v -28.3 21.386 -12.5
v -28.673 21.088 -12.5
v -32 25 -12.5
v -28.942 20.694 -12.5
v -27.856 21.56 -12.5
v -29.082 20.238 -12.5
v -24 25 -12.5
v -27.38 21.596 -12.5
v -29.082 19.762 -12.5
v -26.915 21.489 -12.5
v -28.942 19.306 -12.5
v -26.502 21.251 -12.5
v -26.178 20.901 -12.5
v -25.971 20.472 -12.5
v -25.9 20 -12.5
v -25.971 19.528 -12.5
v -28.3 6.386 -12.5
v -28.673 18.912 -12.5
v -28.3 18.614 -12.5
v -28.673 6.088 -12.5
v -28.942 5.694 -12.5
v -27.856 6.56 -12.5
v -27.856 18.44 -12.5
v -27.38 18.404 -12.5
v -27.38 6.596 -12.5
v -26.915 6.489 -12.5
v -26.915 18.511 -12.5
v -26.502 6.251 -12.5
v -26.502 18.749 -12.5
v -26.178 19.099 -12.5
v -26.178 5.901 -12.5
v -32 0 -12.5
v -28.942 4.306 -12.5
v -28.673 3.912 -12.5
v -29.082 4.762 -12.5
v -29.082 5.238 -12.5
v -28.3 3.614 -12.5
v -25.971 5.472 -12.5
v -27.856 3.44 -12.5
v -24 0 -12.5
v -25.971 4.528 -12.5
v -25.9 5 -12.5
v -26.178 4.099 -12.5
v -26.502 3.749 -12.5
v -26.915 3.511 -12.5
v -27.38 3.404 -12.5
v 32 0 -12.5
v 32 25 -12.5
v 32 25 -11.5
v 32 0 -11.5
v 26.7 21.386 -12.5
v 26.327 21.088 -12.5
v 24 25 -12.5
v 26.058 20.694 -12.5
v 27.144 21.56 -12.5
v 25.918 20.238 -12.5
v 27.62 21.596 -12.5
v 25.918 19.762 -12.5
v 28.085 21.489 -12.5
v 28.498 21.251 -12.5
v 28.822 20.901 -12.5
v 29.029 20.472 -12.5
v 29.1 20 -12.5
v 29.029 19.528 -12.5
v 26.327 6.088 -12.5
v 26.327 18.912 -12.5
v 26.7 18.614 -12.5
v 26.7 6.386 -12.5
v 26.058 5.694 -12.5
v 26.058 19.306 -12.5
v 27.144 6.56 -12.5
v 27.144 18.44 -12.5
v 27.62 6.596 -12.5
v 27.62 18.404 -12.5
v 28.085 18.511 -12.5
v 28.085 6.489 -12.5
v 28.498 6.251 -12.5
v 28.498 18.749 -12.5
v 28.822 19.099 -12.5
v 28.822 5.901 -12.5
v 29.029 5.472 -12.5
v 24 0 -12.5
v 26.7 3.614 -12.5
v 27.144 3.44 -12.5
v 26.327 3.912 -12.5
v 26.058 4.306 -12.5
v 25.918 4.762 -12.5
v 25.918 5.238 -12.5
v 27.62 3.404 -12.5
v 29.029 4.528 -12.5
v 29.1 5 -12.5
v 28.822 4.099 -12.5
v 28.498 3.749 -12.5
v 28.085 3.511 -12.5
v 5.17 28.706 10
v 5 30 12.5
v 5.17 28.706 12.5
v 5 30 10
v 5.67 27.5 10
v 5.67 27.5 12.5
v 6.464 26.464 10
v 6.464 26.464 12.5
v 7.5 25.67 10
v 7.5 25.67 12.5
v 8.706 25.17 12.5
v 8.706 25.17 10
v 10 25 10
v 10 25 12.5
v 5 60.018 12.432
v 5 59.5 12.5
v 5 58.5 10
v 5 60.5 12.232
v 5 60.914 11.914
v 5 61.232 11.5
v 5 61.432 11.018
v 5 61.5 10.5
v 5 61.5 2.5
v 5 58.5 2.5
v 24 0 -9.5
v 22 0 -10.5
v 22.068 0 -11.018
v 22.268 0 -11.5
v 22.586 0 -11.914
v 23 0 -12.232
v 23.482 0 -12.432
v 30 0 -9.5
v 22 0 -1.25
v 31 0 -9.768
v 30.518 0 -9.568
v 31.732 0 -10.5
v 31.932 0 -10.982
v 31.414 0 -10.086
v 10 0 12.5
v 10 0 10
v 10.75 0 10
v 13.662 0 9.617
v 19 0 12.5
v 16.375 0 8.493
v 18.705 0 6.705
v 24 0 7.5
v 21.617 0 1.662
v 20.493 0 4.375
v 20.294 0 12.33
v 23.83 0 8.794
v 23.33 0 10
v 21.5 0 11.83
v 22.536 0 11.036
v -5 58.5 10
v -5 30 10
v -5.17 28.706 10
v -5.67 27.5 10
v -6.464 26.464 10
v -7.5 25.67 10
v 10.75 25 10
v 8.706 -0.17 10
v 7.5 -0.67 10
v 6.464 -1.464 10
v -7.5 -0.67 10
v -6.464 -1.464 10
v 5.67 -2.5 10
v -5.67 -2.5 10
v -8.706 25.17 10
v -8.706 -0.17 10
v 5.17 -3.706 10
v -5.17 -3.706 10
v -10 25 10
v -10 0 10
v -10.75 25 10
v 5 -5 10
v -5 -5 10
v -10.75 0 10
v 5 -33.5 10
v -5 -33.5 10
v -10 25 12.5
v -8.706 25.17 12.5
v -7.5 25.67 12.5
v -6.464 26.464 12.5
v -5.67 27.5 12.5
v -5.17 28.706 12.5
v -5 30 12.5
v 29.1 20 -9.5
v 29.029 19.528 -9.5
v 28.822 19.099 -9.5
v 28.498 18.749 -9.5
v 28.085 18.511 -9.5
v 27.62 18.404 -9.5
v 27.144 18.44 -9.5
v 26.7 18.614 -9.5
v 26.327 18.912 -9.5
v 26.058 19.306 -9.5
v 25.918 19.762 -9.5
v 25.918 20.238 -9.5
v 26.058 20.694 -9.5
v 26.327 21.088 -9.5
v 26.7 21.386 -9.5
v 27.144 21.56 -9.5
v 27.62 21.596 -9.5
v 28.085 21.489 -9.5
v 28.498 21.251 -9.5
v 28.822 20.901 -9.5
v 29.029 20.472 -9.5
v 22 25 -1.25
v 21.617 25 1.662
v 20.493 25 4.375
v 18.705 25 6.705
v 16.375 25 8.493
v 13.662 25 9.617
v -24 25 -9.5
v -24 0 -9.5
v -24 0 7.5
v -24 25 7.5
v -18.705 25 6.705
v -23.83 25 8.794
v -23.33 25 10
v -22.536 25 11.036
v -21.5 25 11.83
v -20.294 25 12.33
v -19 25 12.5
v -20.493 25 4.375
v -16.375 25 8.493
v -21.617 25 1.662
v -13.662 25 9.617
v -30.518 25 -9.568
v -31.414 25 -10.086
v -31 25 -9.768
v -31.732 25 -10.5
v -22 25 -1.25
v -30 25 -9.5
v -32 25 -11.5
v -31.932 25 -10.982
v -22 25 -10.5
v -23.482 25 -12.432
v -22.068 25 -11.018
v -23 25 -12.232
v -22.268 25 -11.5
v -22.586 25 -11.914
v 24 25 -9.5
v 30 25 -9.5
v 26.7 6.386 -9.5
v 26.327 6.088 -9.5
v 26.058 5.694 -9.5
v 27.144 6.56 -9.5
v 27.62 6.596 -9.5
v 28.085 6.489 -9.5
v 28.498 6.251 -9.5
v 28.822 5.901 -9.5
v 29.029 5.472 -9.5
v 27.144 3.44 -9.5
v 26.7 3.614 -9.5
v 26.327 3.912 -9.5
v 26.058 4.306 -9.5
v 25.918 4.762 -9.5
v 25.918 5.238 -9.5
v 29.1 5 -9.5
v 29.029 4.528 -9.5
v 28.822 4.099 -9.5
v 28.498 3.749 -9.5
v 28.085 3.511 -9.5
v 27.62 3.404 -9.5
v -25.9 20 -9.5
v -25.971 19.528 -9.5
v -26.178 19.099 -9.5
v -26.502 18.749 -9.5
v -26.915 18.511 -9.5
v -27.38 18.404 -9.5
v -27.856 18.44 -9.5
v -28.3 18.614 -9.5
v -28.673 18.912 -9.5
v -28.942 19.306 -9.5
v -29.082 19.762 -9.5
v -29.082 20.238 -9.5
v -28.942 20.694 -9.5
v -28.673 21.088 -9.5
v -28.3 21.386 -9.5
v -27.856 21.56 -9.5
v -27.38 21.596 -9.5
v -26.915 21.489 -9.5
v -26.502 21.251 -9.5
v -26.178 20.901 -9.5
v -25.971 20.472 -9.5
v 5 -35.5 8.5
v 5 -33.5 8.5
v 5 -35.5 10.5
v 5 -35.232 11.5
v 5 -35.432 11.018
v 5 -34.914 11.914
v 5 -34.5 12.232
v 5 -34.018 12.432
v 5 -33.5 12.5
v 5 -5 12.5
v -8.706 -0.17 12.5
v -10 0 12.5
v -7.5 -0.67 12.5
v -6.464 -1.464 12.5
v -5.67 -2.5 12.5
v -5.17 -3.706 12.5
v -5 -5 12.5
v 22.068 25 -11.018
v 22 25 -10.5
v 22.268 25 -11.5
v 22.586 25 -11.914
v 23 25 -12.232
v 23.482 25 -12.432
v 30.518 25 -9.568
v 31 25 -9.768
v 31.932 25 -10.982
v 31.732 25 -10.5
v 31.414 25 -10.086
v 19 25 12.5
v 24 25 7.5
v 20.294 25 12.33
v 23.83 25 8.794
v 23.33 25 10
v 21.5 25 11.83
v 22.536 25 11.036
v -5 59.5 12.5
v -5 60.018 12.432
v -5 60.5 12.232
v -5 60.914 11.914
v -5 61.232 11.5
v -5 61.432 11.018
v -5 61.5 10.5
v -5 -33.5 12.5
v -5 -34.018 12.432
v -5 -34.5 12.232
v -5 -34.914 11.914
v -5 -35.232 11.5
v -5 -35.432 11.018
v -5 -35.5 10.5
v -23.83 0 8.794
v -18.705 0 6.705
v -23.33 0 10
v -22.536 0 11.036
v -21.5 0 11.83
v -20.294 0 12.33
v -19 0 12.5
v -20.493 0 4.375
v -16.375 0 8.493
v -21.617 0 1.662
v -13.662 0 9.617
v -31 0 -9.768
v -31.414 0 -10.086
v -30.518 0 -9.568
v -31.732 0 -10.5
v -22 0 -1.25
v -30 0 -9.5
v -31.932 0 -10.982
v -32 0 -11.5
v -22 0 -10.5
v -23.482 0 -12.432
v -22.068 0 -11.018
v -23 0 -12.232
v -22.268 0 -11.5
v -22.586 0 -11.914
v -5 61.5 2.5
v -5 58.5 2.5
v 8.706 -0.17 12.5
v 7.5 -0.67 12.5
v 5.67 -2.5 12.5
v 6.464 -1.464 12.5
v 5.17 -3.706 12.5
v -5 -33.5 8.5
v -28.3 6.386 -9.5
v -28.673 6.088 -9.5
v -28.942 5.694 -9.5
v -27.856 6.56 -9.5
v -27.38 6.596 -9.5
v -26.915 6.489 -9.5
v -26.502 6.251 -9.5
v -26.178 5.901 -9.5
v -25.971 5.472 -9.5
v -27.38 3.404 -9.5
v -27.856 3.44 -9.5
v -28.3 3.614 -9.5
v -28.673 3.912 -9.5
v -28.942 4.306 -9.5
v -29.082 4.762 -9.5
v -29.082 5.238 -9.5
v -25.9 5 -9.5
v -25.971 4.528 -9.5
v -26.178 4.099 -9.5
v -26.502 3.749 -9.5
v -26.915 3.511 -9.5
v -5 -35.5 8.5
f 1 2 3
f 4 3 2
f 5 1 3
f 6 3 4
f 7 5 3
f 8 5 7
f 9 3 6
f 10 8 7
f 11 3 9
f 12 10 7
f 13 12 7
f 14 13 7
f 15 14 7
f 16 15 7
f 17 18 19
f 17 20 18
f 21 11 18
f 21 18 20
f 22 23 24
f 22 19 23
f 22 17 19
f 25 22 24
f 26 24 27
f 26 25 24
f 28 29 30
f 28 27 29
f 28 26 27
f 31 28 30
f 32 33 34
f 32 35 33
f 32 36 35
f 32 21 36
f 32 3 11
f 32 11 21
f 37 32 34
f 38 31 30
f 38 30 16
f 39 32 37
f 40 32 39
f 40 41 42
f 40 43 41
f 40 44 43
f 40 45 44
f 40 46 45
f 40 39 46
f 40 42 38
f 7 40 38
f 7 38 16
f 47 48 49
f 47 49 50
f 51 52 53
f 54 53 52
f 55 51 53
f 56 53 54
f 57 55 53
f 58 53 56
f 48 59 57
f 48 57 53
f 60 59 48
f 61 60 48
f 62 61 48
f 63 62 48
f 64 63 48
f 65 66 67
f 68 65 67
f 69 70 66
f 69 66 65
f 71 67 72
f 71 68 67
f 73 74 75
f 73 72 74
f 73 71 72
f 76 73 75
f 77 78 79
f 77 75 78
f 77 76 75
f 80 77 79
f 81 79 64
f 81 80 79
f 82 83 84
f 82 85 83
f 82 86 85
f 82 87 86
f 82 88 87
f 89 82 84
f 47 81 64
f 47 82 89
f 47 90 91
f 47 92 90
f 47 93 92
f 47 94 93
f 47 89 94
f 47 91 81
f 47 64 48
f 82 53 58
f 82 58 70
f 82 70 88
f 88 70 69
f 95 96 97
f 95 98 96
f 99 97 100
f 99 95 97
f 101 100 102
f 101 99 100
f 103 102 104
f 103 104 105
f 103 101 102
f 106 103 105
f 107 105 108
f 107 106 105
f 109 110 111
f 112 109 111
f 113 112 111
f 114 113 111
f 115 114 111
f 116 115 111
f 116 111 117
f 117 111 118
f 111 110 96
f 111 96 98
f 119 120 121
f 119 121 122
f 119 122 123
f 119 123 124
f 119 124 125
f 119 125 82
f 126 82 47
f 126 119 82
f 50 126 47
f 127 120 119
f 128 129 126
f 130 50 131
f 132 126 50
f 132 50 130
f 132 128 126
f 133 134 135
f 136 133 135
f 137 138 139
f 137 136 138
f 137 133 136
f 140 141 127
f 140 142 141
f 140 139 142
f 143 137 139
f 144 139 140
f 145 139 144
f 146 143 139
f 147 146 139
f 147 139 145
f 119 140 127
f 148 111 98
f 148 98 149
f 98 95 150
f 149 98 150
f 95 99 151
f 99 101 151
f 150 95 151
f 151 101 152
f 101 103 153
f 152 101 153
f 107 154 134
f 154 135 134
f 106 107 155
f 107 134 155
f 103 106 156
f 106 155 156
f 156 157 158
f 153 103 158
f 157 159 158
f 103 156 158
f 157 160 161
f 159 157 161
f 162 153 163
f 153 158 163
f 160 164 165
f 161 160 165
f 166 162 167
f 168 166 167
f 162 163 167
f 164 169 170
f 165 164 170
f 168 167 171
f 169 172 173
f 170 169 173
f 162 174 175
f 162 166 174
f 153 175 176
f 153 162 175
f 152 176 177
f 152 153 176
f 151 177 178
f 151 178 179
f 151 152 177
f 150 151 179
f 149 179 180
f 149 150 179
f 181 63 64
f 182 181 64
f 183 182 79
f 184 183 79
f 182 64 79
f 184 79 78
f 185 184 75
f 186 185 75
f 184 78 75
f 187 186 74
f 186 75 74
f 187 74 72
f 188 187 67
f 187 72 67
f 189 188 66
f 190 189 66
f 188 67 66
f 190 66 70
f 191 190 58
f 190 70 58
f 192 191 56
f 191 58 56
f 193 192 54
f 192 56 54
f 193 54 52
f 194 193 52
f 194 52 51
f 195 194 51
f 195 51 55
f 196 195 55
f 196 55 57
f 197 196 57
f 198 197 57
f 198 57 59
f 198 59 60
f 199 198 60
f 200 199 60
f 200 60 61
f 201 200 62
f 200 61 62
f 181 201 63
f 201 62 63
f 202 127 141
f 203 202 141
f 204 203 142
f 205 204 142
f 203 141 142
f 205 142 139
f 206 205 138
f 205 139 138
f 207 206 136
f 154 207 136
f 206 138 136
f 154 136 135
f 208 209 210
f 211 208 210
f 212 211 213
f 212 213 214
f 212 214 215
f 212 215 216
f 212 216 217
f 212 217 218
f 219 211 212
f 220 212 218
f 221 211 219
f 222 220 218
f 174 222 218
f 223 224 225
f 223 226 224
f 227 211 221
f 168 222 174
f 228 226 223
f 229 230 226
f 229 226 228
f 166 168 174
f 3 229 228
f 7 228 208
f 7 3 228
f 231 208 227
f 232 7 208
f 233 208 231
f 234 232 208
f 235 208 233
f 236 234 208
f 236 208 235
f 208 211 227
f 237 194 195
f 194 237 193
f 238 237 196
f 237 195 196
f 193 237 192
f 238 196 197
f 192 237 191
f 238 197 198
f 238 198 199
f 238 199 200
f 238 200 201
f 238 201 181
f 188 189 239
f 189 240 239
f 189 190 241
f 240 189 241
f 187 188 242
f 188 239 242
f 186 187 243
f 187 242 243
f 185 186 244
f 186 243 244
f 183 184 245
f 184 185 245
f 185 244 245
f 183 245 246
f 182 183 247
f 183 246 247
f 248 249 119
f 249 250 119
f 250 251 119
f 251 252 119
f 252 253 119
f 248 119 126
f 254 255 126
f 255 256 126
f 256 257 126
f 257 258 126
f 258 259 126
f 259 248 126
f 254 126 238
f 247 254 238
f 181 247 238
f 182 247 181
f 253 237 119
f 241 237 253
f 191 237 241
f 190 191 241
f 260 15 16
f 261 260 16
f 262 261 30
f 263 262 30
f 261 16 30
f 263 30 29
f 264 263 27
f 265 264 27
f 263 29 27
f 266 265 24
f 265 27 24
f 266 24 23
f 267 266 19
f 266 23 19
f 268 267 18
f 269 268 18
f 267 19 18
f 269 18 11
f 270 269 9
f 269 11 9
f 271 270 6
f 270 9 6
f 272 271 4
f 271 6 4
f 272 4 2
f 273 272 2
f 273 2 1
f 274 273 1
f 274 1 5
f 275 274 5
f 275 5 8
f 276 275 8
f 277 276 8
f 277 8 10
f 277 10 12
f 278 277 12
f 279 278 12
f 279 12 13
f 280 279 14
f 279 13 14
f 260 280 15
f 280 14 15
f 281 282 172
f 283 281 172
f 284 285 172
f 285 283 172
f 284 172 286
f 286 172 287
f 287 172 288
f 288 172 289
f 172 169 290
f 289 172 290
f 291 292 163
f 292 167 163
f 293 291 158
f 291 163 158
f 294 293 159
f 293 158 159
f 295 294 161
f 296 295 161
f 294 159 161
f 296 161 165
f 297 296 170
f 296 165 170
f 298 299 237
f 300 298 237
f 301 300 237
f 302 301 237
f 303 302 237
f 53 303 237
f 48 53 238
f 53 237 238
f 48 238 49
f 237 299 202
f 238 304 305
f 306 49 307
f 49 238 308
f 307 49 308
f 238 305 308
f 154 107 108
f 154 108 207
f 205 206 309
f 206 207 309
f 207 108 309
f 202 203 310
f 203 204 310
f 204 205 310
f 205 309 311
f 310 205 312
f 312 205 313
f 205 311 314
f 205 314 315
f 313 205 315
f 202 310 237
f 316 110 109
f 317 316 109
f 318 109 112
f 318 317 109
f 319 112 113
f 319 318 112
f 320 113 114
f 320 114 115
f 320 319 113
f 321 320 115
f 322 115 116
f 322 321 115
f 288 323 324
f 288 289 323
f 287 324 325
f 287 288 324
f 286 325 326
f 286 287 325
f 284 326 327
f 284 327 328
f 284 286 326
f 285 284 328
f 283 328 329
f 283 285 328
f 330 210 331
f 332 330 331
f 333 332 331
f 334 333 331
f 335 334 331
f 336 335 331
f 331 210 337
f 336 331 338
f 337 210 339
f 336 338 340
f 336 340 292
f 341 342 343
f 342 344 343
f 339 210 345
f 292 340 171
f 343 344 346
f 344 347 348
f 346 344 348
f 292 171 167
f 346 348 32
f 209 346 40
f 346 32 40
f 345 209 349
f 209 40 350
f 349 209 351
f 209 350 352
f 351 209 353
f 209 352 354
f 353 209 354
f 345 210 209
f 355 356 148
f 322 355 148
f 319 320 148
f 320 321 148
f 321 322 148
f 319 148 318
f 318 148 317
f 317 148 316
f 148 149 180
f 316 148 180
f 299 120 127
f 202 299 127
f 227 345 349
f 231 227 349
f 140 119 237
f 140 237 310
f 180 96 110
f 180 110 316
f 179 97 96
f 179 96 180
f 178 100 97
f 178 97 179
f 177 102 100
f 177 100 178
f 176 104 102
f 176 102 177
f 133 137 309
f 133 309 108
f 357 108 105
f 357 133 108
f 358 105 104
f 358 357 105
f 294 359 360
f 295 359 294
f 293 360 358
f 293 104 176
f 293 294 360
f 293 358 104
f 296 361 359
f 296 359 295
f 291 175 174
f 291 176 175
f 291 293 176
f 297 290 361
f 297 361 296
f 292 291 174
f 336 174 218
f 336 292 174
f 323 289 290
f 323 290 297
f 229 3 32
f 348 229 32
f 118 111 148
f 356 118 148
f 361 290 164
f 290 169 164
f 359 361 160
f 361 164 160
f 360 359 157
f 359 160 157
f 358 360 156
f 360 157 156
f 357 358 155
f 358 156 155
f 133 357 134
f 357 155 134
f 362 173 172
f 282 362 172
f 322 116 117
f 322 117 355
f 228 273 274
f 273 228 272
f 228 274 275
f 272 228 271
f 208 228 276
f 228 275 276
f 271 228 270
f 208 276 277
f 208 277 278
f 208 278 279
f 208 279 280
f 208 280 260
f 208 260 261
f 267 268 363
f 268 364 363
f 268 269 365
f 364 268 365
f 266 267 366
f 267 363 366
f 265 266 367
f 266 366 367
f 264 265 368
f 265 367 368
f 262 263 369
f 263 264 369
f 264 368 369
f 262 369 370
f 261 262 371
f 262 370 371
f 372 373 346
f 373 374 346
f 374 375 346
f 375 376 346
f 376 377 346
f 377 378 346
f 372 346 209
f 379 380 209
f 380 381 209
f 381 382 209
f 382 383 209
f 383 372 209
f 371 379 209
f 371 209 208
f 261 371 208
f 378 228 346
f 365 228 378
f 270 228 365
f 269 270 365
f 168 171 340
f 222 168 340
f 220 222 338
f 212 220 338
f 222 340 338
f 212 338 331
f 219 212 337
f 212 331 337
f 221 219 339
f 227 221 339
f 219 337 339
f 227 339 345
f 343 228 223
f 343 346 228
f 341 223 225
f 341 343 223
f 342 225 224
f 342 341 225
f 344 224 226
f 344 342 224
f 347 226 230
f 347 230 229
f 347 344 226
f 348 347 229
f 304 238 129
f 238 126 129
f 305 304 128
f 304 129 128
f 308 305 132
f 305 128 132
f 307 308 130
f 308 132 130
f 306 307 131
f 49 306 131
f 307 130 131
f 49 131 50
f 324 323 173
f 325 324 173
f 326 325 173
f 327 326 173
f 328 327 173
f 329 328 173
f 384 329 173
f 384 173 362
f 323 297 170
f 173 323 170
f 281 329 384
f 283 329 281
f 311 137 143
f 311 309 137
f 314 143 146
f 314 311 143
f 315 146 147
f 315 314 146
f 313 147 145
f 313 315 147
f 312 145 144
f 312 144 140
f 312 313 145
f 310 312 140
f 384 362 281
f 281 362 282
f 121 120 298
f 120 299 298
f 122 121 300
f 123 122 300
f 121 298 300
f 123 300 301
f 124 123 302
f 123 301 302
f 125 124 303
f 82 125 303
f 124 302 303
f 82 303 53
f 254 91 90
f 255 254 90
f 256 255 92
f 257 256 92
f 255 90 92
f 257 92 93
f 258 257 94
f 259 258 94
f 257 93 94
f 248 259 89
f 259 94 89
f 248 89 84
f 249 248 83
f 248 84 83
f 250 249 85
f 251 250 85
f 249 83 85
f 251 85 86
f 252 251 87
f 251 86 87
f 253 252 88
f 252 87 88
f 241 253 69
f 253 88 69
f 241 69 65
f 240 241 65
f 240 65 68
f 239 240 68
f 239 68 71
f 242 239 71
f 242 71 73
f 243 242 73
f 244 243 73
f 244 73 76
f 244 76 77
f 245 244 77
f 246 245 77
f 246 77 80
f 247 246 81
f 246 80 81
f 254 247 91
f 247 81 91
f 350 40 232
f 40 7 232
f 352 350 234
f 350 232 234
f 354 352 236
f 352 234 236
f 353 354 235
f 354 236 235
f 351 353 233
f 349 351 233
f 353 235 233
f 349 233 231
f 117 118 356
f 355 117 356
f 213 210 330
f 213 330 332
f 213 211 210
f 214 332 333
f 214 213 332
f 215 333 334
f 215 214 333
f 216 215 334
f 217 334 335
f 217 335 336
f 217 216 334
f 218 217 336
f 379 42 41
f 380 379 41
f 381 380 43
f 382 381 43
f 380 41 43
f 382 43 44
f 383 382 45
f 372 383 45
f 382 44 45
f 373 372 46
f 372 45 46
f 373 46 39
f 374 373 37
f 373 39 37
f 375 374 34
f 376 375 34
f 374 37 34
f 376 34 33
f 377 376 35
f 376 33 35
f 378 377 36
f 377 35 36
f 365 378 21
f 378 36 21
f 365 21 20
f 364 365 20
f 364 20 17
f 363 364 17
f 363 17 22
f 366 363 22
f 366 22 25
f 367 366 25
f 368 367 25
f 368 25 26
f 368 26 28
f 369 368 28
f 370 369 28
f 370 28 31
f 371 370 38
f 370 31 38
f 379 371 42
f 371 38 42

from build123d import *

# Parameters (mm, degrees)
F0_W      = 48
F0_H      = 25
F1_DEPTH  = 25
F3_DEPTH  = 25
F4_W      = 10
F4_H      = 33.5
F5_DEPTH  = 2.5
F6_W      = 10
F6_H      = 1.5
F6_H_2    = 2.5
F7_DEPTH  = 2
F8_W      = 10
F8_H      = 7.5
F8_H_2    = 2.5
F9_DEPTH  = 3
F10_W     = 8
F10_H     = 25
F11_DEPTH = 3
F12_R     = 1.6
F13_DEPTH = 3
F14_R     = 5
F15_R     = 2


with BuildPart() as f1:
    # F0 (on Front) → F1 (new body)
    with BuildSketch(Plane.XZ):
        Rectangle(F0_W, F0_H)
    extrude(amount=-F1_DEPTH)

    # F2 (on face) → F3 (cut, through all)
    with BuildSketch(Plane.XZ):
        with BuildLine():
            ThreePointArc((-22, -1.25), (-18.7049512883, -9.2049512883), (-10.75, -12.5))
            Line((-10.75, -12.5), (10.75, -12.5))
            ThreePointArc((10.75, -12.5), (18.7049512883, -9.2049512883), (22, -1.25))
            ThreePointArc((22, -1.25), (18.7049512883, 6.7049512883), (10.75, 10))
            Line((10.75, 10), (-10.75, 10))
            ThreePointArc((-10.75, 10), (-18.7049512883, 6.7049512883), (-22, -1.25))
        make_face()
        with BuildLine():
            Line((-22, -12.5), (-10.75, -12.5))
            ThreePointArc((-10.75, -12.5), (-18.7049512883, -9.2049512883), (-22, -1.25))
            Line((-22, -1.25), (-22, -12.5))
        make_face()
        with BuildLine():
            ThreePointArc((22, -1.25), (18.7049512883, -9.2049512883), (10.75, -12.5))
            Line((10.75, -12.5), (22, -12.5))
            Line((22, -12.5), (22, -1.25))
        make_face()
    extrude(amount=-F3_DEPTH, mode=Mode.SUBTRACT)

    # F4 (on face) → F5 (join, through all)
    with BuildSketch(Plane.XY.offset(12.5)):
        with Locations((0, 41.75)):
            Rectangle(F4_W, F4_H)
        with Locations((0, -16.75)):
            Rectangle(F4_W, F4_H)
    extrude(amount=-F5_DEPTH)

    # F6 (on face) → F7 (join)
    with BuildSketch(Plane.XZ.offset(33.5)):
        with Locations((0, 9.25)):
            Rectangle(F6_W, F6_H)
        with Locations((0, 11.25)):
            Rectangle(F6_W, F6_H_2)
    extrude(amount=F7_DEPTH)

    # F8 (on face) → F9 (join)
    with BuildSketch(Plane(origin=(0, 58.5, 0), x_dir=(-1, 0, 0), z_dir=(0, 1, 0))):
        with Locations((0, 6.25)):
            Rectangle(F8_W, F8_H)
        with Locations((0, 11.25)):
            Rectangle(F8_W, F8_H_2)
    extrude(amount=F9_DEPTH)

    # F10 (on face) → F11 (join)
    with BuildSketch(Plane(origin=(0, 0, -12.5), x_dir=(1, 0, 0), z_dir=(0, 0, -1))):
        with Locations((-28, -12.5)):
            Rectangle(F10_W, F10_H)
        with Locations((28, -12.5)):
            Rectangle(F10_W, F10_H)
    extrude(amount=-F11_DEPTH)

    # F12 (on face) → F13 (cut, through all)
    with BuildSketch(Plane(origin=(0, 0, -12.5), x_dir=(1, 0, 0), z_dir=(0, 0, -1))):
        with Locations((-27.5, -5)):
            Circle(F12_R)
        with Locations((-27.5, -20)):
            Circle(F12_R)
        with Locations((27.5, -20)):
            Circle(F12_R)
        with Locations((27.5, -5)):
            Circle(F12_R)
    extrude(amount=-F13_DEPTH, mode=Mode.SUBTRACT)

    # F14
    f14_edges = [f1.edges().sort_by_distance(p)[0] for p in [
        (-24, 12.5, 12.5),
        (24, 12.5, 12.5),
        (-5, 25, 11.25),
        (-5, 0, 11.25),
        (5, 0, 11.25),
        (5, 25, 11.25),
    ]]
    fillet(f14_edges, radius=F14_R)

    # F15
    f15_edges = [f1.edges().sort_by_distance(p)[0] for p in [
        (0, 61.5, 12.5),
        (0, -35.5, 12.5),
        (22, 12.5, -12.5),
        (-22, 12.5, -12.5),
        (-32, 12.5, -9.5),
        (32, 12.5, -9.5),
    ]]
    fillet(f15_edges, radius=F15_R)


solid = f1.part
